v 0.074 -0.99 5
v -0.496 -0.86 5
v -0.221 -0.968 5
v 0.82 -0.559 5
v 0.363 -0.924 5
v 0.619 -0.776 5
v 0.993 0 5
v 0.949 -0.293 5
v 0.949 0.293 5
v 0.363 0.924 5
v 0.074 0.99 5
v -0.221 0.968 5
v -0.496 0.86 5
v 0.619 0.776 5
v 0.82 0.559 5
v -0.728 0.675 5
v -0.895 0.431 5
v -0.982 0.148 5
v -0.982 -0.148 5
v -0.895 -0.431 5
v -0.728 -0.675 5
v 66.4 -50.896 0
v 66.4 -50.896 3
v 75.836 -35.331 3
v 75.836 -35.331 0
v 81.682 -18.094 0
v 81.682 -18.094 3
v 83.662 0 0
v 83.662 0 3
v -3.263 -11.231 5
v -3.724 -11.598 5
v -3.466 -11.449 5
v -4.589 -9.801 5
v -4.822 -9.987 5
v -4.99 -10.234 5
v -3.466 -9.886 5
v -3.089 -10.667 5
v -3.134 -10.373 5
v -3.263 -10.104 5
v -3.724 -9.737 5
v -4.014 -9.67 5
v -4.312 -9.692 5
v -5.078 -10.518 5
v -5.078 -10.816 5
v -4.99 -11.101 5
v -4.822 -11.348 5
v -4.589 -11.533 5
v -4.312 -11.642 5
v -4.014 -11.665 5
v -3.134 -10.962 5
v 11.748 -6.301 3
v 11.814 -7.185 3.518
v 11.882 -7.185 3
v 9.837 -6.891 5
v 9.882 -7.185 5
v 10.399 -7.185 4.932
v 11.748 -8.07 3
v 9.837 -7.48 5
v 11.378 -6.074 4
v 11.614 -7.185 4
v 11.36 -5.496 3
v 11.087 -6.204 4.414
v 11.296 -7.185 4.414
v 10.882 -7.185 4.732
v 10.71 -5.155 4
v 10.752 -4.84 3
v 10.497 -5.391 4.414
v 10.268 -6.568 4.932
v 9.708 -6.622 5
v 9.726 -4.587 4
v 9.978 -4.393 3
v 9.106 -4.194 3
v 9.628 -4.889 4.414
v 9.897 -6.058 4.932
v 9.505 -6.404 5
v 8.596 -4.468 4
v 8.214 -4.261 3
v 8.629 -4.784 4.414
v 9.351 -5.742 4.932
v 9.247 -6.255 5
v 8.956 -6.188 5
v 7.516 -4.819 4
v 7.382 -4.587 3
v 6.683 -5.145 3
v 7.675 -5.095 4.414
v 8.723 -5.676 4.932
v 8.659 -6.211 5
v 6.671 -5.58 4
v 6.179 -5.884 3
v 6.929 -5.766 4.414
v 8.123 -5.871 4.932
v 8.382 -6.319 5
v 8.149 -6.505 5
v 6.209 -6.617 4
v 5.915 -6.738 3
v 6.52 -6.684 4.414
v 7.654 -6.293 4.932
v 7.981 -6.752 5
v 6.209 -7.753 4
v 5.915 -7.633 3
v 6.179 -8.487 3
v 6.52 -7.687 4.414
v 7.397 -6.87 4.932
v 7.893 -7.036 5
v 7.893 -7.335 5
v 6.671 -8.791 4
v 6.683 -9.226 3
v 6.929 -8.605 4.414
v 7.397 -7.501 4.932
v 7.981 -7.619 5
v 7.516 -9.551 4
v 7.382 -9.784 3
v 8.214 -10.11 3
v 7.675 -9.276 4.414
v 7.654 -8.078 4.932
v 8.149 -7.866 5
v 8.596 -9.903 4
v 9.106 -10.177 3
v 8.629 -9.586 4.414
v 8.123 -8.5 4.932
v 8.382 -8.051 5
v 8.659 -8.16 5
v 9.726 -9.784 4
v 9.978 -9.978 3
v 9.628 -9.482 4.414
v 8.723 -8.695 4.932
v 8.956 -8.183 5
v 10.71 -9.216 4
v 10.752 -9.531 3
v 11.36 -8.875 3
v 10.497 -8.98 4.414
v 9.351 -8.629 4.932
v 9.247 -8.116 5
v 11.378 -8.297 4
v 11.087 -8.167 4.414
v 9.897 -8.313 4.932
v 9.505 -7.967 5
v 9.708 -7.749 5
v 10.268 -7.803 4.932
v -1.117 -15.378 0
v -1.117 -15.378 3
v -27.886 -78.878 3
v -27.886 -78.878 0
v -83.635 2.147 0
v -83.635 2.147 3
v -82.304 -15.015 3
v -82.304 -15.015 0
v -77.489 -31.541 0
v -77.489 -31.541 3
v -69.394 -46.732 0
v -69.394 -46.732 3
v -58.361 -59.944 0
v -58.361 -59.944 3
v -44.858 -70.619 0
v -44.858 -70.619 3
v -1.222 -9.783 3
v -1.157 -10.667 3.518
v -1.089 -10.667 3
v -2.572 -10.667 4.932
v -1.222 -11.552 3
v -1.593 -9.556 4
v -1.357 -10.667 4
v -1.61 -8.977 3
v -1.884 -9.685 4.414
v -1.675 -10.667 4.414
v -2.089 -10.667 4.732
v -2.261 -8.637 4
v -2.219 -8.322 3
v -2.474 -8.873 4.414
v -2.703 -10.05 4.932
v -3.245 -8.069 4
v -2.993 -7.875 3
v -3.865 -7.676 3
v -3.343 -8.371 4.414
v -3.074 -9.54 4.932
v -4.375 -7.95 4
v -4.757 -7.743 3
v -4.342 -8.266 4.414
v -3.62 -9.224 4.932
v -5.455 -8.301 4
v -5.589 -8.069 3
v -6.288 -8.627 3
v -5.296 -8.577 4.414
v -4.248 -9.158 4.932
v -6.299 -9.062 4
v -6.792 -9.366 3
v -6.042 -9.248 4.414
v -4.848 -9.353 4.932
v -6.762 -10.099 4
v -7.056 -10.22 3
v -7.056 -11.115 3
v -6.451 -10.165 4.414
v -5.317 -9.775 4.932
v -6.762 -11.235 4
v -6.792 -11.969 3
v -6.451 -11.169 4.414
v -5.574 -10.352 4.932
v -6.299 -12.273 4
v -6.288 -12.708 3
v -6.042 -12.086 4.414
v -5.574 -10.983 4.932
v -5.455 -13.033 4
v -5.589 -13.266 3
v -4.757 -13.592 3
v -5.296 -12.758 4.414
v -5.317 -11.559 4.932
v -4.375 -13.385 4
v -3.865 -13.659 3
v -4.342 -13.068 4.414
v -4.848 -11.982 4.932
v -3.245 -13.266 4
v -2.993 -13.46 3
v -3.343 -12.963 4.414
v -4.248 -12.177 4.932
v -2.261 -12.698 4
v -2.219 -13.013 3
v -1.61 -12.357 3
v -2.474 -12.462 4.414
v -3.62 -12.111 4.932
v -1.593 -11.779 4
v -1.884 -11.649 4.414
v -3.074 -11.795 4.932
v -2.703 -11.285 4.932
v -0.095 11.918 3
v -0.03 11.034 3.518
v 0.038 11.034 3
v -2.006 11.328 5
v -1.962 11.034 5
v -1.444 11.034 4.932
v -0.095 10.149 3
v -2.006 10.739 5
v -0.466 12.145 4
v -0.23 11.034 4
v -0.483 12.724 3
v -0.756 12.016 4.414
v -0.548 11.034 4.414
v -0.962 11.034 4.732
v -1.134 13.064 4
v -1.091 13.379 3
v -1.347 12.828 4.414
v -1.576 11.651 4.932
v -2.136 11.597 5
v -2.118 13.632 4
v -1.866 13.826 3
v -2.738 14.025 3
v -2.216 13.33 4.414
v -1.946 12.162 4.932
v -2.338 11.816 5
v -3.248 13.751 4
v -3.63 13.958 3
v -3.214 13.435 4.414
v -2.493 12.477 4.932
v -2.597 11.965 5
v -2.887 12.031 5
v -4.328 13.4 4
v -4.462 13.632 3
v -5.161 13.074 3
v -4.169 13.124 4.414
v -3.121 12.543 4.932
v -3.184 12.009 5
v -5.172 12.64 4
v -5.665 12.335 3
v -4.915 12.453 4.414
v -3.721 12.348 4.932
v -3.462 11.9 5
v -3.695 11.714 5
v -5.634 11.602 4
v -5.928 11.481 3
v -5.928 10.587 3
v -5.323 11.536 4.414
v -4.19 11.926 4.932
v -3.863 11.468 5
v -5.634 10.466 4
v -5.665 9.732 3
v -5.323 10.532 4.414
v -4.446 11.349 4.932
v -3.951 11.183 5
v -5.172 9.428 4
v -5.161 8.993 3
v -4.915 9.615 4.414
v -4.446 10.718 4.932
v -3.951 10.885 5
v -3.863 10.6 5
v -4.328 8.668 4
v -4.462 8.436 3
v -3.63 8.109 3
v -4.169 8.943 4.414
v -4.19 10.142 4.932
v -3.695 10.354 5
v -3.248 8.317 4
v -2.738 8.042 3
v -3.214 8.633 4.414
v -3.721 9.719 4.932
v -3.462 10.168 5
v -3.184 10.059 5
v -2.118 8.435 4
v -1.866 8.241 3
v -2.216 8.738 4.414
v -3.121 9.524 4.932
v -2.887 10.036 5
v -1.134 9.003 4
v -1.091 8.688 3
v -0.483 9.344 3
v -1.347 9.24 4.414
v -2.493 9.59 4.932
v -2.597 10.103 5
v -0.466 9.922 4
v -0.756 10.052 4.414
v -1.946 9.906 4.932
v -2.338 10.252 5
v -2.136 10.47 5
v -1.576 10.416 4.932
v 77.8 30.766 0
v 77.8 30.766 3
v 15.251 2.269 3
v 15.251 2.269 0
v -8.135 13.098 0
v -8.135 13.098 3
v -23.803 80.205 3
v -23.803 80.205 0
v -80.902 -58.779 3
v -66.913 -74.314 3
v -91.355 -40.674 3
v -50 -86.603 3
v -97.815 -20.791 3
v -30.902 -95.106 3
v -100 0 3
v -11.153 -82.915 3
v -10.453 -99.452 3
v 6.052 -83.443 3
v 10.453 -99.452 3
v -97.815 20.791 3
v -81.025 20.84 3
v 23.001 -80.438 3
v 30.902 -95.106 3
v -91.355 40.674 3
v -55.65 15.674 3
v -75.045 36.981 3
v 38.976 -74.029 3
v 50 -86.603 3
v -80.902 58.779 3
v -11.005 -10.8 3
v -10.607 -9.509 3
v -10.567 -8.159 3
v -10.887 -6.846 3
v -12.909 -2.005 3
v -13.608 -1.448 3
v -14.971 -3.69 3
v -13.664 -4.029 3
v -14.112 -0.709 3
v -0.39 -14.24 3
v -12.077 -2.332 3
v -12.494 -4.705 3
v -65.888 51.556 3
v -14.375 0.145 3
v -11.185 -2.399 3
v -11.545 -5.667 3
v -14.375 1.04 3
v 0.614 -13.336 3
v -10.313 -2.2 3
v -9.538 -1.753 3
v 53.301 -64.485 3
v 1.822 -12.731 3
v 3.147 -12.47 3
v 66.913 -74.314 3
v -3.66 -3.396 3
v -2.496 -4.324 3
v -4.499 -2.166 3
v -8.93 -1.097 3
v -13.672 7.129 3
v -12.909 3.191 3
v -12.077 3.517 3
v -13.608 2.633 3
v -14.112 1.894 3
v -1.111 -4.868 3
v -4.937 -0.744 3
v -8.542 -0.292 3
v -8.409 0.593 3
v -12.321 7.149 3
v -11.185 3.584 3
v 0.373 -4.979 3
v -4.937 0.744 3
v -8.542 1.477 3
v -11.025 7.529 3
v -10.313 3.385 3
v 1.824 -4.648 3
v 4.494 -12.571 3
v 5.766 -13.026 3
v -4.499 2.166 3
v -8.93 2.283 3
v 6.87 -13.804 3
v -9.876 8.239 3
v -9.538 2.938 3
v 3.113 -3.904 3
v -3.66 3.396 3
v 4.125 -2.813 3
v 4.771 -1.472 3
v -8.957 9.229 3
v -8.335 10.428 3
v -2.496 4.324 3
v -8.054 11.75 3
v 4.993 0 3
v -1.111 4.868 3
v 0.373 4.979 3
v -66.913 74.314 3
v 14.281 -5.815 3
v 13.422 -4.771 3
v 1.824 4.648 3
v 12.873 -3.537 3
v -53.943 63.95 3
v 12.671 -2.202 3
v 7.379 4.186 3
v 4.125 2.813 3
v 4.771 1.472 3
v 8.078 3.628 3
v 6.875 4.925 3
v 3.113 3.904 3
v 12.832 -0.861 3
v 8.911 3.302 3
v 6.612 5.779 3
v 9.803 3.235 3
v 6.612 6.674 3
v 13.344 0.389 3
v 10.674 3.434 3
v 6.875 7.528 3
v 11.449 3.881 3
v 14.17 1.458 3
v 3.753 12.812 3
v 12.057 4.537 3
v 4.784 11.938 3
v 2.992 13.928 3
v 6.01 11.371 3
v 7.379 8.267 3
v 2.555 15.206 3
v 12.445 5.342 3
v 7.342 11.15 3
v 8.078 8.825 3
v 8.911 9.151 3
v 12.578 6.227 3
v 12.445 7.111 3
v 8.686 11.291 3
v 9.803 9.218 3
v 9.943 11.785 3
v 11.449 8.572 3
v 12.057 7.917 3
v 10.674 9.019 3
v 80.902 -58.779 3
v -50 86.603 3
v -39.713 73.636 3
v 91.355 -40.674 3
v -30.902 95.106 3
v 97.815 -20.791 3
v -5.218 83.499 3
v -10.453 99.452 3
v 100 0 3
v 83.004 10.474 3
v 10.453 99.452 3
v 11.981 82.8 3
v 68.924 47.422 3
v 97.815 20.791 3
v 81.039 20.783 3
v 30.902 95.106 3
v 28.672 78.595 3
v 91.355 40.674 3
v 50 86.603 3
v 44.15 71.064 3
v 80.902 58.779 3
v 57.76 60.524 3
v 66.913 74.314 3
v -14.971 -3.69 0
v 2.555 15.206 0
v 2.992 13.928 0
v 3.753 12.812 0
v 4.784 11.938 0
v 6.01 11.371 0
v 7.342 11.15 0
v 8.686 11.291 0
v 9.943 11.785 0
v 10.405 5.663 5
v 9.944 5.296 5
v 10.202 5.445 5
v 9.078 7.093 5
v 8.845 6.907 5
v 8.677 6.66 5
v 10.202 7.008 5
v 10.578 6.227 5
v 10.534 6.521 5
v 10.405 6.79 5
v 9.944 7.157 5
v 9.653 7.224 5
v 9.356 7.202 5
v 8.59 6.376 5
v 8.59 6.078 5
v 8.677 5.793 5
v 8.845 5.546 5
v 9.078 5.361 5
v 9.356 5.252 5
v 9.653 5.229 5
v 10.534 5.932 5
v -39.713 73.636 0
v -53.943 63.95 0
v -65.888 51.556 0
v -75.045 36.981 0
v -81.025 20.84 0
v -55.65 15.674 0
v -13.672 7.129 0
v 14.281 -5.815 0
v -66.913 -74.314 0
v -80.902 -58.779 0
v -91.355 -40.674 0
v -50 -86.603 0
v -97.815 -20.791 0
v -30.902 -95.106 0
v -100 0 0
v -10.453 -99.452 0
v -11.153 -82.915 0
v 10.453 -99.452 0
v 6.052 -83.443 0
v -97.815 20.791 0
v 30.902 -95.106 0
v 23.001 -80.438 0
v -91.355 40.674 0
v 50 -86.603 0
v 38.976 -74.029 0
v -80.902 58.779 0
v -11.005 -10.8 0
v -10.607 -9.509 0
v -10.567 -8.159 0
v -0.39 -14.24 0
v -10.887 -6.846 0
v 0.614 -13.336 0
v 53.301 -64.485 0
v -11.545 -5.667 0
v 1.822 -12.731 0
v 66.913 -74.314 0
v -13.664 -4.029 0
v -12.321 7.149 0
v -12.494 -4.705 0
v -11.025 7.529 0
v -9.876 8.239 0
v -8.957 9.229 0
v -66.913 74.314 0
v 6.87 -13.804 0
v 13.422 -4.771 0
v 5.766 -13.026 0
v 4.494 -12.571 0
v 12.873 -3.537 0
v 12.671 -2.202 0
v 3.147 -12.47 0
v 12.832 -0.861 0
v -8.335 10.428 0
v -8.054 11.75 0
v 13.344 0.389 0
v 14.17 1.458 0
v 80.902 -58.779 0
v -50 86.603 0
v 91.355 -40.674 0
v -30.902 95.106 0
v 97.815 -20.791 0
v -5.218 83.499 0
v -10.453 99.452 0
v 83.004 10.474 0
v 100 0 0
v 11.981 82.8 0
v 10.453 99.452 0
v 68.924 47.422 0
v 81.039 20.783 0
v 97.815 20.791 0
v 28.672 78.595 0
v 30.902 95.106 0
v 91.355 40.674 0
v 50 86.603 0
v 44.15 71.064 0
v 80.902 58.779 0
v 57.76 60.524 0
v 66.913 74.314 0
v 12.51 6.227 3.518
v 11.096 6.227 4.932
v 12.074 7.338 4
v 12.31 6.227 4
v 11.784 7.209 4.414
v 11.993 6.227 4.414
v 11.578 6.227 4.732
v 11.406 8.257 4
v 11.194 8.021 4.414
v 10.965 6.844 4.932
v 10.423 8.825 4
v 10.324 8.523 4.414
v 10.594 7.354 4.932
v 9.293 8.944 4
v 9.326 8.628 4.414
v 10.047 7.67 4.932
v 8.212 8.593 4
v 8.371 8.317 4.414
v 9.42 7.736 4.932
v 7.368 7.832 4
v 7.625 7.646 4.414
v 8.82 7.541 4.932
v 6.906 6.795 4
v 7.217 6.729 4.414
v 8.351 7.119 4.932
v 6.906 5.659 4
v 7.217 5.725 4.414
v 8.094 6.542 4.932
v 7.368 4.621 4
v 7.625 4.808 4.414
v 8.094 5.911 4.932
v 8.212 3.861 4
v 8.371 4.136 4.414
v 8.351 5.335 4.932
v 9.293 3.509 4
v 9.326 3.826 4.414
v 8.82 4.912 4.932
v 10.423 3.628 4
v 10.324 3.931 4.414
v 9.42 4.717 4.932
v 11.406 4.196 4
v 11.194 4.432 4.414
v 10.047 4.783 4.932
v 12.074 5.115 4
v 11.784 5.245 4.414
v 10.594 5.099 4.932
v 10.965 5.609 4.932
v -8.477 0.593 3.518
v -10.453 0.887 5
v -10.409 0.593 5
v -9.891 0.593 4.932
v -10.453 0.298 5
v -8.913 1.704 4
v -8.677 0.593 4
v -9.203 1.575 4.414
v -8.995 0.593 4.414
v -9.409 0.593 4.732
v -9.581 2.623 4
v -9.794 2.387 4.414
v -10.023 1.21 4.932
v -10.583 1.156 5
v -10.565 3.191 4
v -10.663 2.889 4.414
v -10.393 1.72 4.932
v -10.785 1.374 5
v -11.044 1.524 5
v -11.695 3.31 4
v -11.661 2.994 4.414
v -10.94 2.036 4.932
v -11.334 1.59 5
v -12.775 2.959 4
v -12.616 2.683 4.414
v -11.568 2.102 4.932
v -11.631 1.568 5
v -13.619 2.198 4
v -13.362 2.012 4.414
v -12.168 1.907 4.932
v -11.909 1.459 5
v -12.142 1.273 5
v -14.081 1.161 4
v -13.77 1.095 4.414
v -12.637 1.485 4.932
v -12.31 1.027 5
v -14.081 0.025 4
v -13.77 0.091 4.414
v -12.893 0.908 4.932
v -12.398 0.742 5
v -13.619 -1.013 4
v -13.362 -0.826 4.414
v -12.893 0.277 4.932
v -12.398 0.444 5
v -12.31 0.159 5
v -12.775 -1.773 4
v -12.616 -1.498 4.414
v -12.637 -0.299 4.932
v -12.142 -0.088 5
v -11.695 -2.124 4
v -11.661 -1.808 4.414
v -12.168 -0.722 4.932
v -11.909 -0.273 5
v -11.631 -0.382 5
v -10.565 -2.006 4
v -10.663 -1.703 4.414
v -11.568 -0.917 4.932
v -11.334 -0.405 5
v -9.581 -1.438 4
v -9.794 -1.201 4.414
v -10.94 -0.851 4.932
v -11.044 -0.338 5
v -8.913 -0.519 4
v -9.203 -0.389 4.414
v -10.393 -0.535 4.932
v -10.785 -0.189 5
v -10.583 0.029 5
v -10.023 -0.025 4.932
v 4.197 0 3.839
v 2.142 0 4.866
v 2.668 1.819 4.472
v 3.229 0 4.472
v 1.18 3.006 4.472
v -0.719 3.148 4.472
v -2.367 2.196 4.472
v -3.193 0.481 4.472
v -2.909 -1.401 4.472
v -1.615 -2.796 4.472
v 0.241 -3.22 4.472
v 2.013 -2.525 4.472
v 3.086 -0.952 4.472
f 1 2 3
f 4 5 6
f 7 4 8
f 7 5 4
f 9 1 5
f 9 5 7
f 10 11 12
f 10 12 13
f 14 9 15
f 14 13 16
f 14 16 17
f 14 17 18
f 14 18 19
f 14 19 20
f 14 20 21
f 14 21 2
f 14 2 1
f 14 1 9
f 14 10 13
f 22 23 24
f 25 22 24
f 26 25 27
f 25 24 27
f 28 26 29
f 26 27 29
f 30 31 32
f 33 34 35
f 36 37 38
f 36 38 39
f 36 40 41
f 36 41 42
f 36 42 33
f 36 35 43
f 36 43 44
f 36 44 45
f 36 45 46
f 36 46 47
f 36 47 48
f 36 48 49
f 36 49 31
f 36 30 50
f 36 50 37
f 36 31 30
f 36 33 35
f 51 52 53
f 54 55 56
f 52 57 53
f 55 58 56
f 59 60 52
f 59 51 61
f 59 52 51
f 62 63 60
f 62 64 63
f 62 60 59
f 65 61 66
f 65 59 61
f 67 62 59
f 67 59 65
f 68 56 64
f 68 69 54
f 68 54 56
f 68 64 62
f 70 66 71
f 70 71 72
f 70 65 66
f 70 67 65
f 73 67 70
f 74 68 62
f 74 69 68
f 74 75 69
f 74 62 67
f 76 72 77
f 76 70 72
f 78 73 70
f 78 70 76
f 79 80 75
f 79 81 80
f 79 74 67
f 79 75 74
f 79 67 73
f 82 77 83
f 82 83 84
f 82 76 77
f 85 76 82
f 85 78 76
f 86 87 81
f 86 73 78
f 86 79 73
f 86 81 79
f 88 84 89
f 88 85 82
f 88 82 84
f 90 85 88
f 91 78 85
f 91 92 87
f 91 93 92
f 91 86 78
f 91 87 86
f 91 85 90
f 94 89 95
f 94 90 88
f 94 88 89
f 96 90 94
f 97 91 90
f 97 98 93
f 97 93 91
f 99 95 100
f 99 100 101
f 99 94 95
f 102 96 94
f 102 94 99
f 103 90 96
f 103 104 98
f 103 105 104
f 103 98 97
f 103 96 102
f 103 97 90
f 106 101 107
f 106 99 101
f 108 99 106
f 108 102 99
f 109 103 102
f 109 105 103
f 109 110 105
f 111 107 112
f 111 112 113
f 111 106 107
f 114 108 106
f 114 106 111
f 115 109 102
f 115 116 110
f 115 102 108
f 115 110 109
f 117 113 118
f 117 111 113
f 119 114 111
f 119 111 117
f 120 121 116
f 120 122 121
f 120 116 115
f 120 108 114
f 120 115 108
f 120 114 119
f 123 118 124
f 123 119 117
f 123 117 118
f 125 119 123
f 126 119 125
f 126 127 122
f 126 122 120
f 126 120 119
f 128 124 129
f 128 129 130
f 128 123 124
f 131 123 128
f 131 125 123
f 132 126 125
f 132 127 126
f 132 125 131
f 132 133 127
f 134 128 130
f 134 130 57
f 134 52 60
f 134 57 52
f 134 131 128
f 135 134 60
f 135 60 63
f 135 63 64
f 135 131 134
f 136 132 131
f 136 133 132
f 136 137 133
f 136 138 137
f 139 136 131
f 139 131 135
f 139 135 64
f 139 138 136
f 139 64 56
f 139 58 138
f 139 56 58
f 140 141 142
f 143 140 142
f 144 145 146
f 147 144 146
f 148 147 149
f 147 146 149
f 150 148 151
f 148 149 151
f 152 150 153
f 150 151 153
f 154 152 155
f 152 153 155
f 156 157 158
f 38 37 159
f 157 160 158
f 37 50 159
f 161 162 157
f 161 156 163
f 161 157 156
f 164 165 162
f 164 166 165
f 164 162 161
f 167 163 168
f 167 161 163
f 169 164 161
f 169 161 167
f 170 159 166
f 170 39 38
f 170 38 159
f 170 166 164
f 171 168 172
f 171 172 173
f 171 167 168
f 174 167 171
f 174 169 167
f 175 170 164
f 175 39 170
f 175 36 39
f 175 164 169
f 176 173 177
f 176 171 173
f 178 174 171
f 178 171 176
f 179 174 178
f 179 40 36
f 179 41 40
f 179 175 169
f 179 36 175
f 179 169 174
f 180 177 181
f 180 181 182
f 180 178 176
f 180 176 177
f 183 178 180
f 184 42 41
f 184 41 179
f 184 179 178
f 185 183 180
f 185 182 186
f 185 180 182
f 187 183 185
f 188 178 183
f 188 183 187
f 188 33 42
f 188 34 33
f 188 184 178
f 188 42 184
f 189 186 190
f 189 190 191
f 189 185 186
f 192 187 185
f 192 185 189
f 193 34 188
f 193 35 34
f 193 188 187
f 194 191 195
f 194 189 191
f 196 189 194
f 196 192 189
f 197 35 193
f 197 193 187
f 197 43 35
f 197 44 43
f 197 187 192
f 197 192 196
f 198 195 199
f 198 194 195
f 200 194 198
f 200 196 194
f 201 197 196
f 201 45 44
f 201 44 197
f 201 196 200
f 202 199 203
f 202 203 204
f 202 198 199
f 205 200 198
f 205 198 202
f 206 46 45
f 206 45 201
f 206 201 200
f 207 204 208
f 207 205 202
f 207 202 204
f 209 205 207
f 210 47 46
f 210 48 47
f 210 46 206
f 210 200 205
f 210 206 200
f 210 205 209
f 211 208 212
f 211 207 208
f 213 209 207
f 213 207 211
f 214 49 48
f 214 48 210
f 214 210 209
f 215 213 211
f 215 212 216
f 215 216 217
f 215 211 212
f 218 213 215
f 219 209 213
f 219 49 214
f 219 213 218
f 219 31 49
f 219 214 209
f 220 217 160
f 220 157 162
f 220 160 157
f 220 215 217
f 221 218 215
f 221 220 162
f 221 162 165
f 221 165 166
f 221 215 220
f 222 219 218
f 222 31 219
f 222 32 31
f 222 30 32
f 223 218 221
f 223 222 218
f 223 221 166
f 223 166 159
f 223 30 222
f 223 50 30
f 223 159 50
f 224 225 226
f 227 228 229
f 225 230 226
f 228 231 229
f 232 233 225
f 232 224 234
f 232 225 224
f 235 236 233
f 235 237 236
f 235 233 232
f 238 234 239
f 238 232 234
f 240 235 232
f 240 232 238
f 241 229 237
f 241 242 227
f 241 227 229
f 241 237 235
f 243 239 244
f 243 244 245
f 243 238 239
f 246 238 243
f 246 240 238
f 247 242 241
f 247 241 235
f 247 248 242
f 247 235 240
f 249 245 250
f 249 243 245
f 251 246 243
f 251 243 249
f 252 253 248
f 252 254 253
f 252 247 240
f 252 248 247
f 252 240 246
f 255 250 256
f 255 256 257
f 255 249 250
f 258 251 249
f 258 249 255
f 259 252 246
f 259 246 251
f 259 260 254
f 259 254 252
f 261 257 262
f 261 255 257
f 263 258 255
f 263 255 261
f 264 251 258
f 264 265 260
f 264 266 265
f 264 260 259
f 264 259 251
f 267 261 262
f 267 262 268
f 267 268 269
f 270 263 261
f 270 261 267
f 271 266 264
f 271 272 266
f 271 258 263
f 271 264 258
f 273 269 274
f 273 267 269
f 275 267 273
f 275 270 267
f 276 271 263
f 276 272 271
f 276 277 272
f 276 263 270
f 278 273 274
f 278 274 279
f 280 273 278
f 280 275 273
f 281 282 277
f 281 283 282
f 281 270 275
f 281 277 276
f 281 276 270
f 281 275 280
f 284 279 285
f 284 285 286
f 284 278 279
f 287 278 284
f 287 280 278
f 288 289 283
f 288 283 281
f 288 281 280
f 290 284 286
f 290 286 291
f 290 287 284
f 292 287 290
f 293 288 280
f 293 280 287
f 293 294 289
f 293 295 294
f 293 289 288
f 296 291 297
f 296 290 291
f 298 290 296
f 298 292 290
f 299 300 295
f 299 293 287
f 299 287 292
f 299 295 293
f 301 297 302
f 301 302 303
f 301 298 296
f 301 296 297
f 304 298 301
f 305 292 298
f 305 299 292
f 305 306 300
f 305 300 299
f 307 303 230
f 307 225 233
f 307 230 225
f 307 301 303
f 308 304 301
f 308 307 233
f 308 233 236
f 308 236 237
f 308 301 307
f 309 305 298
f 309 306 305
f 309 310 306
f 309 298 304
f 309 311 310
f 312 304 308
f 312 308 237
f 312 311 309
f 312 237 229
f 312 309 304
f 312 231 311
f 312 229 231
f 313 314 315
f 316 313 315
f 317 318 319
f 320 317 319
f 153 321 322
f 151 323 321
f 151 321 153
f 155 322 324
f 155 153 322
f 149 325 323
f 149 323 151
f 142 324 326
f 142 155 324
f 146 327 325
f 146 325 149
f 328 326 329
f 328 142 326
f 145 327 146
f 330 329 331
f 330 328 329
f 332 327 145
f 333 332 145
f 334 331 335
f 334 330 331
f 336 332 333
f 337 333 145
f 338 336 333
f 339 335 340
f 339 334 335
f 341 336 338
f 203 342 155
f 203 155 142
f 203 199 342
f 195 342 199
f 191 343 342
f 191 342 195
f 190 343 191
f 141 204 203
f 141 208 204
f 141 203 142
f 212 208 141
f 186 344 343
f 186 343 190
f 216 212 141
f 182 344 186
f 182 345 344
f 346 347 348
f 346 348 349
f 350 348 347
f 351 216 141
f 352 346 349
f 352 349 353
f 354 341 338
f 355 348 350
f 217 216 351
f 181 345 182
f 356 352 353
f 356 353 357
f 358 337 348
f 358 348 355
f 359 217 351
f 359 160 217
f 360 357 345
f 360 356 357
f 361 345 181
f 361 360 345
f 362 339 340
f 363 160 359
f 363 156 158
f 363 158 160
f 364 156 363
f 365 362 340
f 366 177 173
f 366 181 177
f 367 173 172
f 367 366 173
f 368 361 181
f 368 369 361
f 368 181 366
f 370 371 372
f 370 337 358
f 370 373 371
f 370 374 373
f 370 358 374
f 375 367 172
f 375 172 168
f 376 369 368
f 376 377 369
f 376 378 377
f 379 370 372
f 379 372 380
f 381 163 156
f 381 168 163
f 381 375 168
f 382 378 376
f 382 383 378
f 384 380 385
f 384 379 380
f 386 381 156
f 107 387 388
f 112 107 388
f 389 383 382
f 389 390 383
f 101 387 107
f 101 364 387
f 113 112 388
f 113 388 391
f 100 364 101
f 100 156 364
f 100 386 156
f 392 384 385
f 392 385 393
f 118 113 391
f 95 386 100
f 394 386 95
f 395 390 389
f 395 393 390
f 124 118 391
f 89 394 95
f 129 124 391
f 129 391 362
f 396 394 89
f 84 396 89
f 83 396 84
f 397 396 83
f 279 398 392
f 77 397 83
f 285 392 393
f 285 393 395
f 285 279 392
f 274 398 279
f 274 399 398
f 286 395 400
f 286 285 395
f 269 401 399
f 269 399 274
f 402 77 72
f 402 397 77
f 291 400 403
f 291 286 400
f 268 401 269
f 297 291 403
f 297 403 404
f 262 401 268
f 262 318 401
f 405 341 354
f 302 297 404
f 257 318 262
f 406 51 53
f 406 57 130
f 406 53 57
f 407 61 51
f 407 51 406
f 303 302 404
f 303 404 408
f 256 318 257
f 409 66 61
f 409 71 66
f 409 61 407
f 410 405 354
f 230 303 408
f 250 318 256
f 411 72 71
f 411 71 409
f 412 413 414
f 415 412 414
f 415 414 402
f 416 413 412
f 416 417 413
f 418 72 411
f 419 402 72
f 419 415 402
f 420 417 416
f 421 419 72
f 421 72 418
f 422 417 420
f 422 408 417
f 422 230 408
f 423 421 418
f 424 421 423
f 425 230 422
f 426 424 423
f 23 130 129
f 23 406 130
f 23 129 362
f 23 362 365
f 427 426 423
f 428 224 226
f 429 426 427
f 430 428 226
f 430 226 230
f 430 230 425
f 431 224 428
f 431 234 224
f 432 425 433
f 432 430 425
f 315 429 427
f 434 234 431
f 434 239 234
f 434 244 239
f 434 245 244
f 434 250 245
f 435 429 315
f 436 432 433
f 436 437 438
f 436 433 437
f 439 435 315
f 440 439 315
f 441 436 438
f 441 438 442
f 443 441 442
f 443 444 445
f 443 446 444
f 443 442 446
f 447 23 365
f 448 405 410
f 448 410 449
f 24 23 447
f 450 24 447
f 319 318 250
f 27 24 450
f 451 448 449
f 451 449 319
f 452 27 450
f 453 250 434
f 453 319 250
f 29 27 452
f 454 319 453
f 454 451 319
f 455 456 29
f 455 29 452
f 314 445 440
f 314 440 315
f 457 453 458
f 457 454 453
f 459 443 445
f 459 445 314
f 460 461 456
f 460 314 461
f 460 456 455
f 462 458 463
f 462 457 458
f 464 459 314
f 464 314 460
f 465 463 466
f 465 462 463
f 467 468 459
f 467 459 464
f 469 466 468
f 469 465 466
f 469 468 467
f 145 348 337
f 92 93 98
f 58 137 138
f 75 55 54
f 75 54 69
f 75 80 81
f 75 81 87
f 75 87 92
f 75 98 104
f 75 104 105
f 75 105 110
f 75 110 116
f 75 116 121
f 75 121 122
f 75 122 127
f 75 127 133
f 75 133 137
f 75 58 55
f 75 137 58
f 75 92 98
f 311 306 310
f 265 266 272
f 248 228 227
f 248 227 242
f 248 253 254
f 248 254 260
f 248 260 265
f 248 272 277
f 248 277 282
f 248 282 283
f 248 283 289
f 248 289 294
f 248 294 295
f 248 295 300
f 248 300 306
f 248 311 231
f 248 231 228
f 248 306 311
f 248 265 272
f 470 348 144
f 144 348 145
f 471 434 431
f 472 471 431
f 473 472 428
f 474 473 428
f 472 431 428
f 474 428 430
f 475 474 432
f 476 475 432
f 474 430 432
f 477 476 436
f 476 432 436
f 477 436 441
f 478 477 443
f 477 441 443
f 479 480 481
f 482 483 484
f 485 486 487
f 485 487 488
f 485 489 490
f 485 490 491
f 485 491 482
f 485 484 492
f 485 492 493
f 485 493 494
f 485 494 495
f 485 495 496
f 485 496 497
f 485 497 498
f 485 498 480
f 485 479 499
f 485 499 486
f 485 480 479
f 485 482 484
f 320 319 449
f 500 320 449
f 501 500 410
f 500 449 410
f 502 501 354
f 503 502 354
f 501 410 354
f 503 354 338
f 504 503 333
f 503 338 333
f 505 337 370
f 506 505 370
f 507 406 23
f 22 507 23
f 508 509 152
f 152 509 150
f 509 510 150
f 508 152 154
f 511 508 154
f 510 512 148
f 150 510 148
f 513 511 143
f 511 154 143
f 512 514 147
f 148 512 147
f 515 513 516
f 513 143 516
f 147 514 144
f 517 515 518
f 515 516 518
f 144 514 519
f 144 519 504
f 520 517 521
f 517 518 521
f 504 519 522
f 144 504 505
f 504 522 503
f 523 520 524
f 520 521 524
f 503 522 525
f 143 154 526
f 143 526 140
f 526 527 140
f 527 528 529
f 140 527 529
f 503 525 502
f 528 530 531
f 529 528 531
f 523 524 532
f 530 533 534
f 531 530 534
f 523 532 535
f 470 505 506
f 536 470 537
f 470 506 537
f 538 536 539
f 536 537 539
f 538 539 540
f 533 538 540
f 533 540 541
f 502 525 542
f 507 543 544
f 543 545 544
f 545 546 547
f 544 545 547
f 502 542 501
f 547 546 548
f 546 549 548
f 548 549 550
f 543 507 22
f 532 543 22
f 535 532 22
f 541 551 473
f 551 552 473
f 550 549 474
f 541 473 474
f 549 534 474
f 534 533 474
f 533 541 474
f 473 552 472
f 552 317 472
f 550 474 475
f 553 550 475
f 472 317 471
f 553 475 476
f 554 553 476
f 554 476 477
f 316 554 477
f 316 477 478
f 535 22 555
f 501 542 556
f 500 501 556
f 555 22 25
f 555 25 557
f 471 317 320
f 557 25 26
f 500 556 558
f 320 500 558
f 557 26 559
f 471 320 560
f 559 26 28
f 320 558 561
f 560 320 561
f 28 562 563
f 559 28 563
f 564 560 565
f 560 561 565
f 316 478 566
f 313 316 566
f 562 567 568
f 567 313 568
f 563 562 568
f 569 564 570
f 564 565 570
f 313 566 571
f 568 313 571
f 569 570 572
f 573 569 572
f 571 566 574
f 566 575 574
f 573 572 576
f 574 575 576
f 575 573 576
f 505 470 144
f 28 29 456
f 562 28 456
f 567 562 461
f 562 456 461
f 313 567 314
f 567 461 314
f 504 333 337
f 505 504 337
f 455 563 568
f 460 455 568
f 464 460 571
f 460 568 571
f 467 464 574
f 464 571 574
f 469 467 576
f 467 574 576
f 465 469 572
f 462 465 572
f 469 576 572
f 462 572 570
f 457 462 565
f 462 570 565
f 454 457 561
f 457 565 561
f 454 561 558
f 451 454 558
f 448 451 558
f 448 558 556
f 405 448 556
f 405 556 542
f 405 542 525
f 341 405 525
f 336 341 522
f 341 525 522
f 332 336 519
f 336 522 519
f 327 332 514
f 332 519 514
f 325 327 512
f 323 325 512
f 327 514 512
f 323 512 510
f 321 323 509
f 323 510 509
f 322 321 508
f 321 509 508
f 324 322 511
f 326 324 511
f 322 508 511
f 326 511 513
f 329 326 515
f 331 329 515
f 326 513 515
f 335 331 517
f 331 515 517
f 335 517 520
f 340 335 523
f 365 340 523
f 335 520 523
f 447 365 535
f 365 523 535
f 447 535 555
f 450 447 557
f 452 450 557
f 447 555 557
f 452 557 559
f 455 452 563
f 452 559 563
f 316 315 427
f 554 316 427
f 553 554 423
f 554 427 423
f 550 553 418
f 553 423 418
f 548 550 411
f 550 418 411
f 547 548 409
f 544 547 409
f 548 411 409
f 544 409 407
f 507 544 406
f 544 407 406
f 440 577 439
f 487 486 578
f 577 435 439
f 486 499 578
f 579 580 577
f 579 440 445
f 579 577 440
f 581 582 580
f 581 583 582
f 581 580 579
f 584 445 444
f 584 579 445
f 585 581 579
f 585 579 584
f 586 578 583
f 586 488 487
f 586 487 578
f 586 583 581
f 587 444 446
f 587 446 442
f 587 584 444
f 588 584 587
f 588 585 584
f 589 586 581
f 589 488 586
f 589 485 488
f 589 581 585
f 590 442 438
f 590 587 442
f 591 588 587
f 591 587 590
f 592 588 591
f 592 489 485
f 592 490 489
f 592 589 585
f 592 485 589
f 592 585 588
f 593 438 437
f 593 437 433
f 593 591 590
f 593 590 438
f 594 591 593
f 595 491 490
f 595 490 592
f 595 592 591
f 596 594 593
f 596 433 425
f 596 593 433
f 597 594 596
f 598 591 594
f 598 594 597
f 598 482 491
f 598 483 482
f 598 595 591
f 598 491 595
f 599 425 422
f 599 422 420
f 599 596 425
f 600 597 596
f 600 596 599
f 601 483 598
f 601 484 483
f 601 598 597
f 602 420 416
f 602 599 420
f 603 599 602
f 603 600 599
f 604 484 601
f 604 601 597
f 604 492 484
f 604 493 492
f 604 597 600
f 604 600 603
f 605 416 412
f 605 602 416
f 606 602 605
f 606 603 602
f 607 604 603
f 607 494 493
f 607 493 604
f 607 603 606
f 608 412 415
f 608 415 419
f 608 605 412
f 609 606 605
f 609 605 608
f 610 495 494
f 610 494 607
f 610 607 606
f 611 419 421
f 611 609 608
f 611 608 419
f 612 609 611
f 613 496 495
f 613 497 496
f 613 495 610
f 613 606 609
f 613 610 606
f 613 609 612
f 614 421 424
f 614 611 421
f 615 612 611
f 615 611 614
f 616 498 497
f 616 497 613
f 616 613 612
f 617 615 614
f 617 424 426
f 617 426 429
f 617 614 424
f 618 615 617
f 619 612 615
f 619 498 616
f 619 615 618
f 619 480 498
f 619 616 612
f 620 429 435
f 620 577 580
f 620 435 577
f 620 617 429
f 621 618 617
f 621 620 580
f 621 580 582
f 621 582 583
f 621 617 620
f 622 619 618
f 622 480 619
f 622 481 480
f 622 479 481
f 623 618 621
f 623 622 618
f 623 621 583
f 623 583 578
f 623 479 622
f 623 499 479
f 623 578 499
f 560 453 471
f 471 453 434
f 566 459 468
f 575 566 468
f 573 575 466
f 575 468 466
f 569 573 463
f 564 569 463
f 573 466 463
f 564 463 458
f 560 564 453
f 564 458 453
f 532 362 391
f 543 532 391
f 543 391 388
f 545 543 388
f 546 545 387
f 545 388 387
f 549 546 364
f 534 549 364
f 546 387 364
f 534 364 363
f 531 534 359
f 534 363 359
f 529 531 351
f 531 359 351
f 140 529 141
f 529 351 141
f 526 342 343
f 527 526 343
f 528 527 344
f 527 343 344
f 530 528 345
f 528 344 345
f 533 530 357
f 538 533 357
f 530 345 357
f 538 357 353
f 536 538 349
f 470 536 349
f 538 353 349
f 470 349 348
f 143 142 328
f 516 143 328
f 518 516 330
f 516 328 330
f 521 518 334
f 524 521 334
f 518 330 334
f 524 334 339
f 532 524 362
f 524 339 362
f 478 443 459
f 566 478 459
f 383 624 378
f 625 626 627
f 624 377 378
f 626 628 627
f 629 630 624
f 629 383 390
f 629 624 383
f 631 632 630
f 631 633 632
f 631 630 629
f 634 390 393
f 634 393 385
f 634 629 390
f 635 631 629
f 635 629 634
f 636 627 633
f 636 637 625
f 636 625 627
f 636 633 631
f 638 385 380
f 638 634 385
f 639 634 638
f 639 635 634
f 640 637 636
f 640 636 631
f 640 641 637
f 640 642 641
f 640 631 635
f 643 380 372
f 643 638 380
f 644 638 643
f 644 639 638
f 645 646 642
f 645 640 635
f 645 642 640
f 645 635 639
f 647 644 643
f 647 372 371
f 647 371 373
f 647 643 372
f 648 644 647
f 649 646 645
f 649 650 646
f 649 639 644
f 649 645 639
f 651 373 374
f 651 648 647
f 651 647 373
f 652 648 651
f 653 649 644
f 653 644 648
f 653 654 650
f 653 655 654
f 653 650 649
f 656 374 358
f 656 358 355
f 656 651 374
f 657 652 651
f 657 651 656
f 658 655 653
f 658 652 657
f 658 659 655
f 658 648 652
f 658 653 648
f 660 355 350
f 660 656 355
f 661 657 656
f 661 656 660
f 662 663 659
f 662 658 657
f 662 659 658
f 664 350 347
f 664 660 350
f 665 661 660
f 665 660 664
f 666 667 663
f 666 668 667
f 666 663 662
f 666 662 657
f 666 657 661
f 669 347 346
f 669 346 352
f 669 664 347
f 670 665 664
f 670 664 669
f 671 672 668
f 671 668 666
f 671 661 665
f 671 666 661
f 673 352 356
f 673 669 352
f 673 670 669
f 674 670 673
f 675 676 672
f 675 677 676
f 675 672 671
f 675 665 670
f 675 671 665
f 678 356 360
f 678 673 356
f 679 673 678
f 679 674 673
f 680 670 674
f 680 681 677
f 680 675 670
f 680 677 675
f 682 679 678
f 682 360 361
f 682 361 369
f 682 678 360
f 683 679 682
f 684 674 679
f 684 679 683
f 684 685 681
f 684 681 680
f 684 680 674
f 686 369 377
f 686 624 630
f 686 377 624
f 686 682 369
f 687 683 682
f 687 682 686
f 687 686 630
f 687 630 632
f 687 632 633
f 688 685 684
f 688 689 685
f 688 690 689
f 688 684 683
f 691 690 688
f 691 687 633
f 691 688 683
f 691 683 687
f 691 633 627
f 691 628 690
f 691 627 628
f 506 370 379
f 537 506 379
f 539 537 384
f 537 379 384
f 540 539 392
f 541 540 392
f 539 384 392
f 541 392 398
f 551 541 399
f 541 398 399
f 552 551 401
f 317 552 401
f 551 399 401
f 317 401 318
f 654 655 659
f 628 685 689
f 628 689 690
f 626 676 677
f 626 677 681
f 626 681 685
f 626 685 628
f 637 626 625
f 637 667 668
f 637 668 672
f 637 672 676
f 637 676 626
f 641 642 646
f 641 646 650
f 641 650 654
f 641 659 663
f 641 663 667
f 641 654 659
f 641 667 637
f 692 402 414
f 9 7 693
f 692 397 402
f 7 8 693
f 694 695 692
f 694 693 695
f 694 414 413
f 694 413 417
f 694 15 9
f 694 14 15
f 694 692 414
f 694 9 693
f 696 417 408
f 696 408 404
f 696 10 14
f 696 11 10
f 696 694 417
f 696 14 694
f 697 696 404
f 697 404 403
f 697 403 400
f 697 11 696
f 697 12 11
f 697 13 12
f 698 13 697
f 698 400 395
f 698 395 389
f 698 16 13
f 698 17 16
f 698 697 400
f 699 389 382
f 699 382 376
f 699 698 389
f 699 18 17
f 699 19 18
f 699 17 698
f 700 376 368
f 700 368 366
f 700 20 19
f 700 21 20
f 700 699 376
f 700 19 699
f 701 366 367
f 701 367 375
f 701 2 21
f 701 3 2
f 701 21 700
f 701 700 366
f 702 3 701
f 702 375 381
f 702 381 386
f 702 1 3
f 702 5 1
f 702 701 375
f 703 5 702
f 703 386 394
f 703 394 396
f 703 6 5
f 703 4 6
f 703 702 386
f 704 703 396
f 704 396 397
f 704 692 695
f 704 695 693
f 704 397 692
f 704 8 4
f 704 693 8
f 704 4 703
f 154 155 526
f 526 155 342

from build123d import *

# Parameters (mm, degrees)
F0_R     = 100
F1_DEPTH = 3
F2_R     = 3
F3_DEPTH = 2
F4_R     = 4.9929816157
F5_DEPTH = 2
F6_R     = 1.99999
F9_DEPTH = 3


# Not quite as in the source:
# - a fillet or chamfer that OpenCascade refuses, or shapes differently, is made with other operations: its cross-section is extruded or revolved along the edge and cut away or added
# - a fillet or chamfer is up to 0.001 mm smaller than in the source, because OpenCascade refuses the exact size


with BuildPart() as f1:
    # F0 (on Top) → F1 (new body)
    with BuildSketch(Plane.XY):
        Circle(F0_R)
    extrude(amount=F1_DEPTH)

    # F2 (on face) → F3 (join)
    with BuildSketch(Plane.XY.offset(3)):
        with Locations((-2.9619428524, 11.0336985157)):
            Circle(F2_R)
        with Locations((9.5783801944, 6.2265754028)):
            Circle(F2_R)
        with Locations((-11.4089615499, 0.5926253015)):
            Circle(F2_R)
        with Locations((-4.0891831618, -10.6674359368)):
            Circle(F2_R)
        with Locations((8.8817073697, -7.1854632832)):
            Circle(F2_R)
    extrude(amount=F3_DEPTH)

    # F4 (on face) → F5 (join)
    with BuildSketch(Plane.XY.offset(3)):
        Circle(F4_R)
    extrude(amount=F5_DEPTH)

    # F6 (radius 2 in the source; OpenCascade refuses exactly that, so slightly less here)
    f6_edges = [f1.edges().sort_by_distance(p)[0] for p in [
        (-5.961943, 11.033699, 5),
        (6.57838, 6.226575, 5),
        (-14.408962, 0.592625, 5),
        (-7.089183, -10.667436, 5),
        (5.881707, -7.185463, 5),
    ]]
    fillet(f6_edges, radius=F6_R)

    # F7: fillet of radius 5 on 1 edges, made by hand

    # F7_s1 → F7_t2 (revolve, cut)
    with BuildSketch(Plane.XZ):
        with BuildLine():
            ThreePointArc((4.9929816157, 3), (3.2290495932, 4.472135955), (0.9929816157, 5))
            Line((0.9929816157, 5), (4.9929816157, 5))
            Line((4.9929816157, 5), (4.9929816157, 3))
        make_face()
    revolve(axis=Axis((0, 0, 5), (0, 0, 1)), mode=Mode.SUBTRACT)

    # F8 (on face) → F9 (cut, through all)
    with BuildSketch(Plane.XY.offset(3)):
        with BuildLine():
            ThreePointArc((66.3999116797, -50.8959301615), (79.2290945271, -26.8718171788), (83.6620820807, 0))
            ThreePointArc((83.6620820807, 0), (82.1834696388, 15.6595432948), (77.7998972031, 30.7655647318))
            Line((77.7998972031, 30.7655647318), (15.2511779268, 2.2686341687))
            Line((15.2511779268, 2.2686341687), (17.7023078517, -2.1256138206))
            Line((17.7023078517, -2.1256138206), (14.2805704694, -5.8146742141))
            Line((14.2805704694, -5.8146742141), (66.3999116797, -50.8959301615))
        make_face()
        with BuildLine():
            Line((9.9430227659, 11.7847964524), (68.923607167, 47.42236132))
            ThreePointArc((68.923607167, 47.42236132), (36.6056794276, 75.2287724991), (-5.2183004193, 83.4991815458))
            Line((-5.2183004193, 83.4991815458), (2.5552738543, 15.2057786606))
            Line((2.5552738543, 15.2057786606), (7.491892841, 16.1790444417))
            Line((7.491892841, 16.1790444417), (9.9430227659, 11.7847964524))
        make_face()
        with BuildLine():
            Line((17.7023078517, -2.1256138206), (15.2511779268, 2.2686341687))
            ThreePointArc((15.2511779268, 2.2686341687), (12.7065485295, -1.5257454222), (14.2805704694, -5.8146742141))
            Line((14.2805704694, -5.8146742141), (17.7023078517, -2.1256138206))
        make_face()
        with BuildLine():
            ThreePointArc((-27.886204899, -78.8777760489), (14.6037462755, -82.3776339354), (53.3012812121, -64.4850168584))
            Line((53.3012812121, -64.4850168584), (6.8704724729, -13.8036856363))
            Line((6.8704724729, -13.8036856363), (3.4487350906, -17.4927460298))
            Line((3.4487350906, -17.4927460298), (-1.1171448371, -15.3784627502))
            Line((-1.1171448371, -15.3784627502), (-27.886204899, -78.8777760489))
        make_face()
        with BuildLine():
            ThreePointArc((2.5552738543, 15.2057786606), (5.3776095614, 11.613164514), (9.9430227659, 11.7847964524))
            Line((9.9430227659, 11.7847964524), (7.491892841, 16.1790444417))
            Line((7.491892841, 16.1790444417), (2.5552738543, 15.2057786606))
        make_face()
        with BuildLine():
            Line((3.4487350906, -17.4927460298), (6.8704724729, -13.8036856363))
            ThreePointArc((6.8704724729, -13.8036856363), (2.4754693095, -12.5561270431), (-1.1171448371, -15.3784627502))
            Line((-1.1171448371, -15.3784627502), (3.4487350906, -17.4927460298))
        make_face()
        with BuildLine():
            Line((-17.7639668564, 54.3390592143), (-23.8027798233, 80.204561284))
            ThreePointArc((-23.8027798233, 80.204561284), (-60.2350372644, 58.0610391212), (-81.0249842257, 20.8397674963))
            Line((-81.0249842257, 20.8397674963), (-55.6504609188, 15.6744066086))
            ThreePointArc((-55.6504609188, 15.6744066086), (-29.7834804383, 28.2223454015), (-17.7639668564, 54.3390592143))
        make_face()
        with BuildLine():
            ThreePointArc((-83.6345341245, 2.1467836063), (-73.8329797706, -39.3450769001), (-44.8578937701, -70.6194969154))
            Line((-44.8578937701, -70.6194969154), (-11.0049924198, -10.799781062))
            Line((-11.0049924198, -10.799781062), (-15.5708723475, -8.6854977824))
            Line((-15.5708723475, -8.6854977824), (-14.971003949, -3.6897384602))
            Line((-14.971003949, -3.6897384602), (-83.6345341245, 2.1467836063))
        make_face()
        with BuildLine():
            Line((-8.1354444491, 13.0980789722), (-17.7639668564, 54.3390592143))
            ThreePointArc((-17.7639668564, 54.3390592143), (-29.7834804383, 28.2223454015), (-55.6504609188, 15.6744066086))
            Line((-55.6504609188, 15.6744066086), (-13.6719318343, 7.1290538689))
            Line((-13.6719318343, 7.1290538689), (-13.0720634358, 12.1248131911))
            Line((-13.0720634358, 12.1248131911), (-8.1354444491, 13.0980789722))
        make_face()
        with BuildLine():
            ThreePointArc((-13.6719318343, 7.1290538689), (-9.3830030423, 8.7030758088), (-8.1354444491, 13.0980789722))
            Line((-8.1354444491, 13.0980789722), (-13.0720634358, 12.1248131911))
            Line((-13.0720634358, 12.1248131911), (-13.6719318343, 7.1290538689))
        make_face()
        with BuildLine():
            Line((-15.5708723475, -8.6854977824), (-11.0049924198, -10.799781062))
            ThreePointArc((-11.0049924198, -10.799781062), (-11.1766243581, -6.2343678575), (-14.971003949, -3.6897384602))
            Line((-14.971003949, -3.6897384602), (-15.5708723475, -8.6854977824))
        make_face()
    extrude(amount=-F9_DEPTH, mode=Mode.SUBTRACT)


solid = f1.part
